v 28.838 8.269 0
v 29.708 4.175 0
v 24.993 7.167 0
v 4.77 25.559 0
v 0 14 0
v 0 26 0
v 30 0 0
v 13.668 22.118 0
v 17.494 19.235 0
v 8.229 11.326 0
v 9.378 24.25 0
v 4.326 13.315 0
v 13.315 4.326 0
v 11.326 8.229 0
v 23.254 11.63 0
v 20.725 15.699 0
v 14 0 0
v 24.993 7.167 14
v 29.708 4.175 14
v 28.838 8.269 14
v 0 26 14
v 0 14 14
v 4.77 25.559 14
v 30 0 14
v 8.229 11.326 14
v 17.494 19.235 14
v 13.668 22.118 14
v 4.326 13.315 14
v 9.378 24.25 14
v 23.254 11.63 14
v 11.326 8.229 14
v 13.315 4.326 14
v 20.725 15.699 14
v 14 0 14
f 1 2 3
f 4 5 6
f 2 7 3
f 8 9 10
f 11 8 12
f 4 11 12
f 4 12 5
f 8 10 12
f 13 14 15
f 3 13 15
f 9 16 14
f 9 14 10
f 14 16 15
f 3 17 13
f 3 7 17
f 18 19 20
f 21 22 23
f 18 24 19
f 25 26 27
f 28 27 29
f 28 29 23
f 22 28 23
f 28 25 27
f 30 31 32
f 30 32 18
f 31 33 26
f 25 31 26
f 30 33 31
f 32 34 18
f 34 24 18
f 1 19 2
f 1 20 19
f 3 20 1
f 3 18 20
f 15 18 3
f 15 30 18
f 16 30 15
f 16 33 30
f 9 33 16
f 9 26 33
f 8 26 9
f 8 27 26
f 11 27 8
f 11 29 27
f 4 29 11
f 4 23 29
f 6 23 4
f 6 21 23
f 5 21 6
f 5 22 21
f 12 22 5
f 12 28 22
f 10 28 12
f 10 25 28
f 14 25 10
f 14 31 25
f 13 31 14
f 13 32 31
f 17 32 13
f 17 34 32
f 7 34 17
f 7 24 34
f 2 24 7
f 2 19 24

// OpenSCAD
$fn = 32;

// ----------------------------------------------------------------------
// Arc stop: segment, 14 mm thick
// ----------------------------------------------------------------------

// --- parameters (mm) ---
profile_height = 14;      // extrusion height
profile_points = 17;      // points of the closed outline

profile = [[30, 0], [29.708, 4.175], [28.838, 8.269], [24.993, 7.167], [23.254, 11.63], [20.725, 15.699], [17.494, 19.235], [13.668, 22.118], [9.378, 24.25], [4.77, 25.559], [0, 26], [0, 14], [4.326, 13.315], [8.229, 11.326], [11.326, 8.229], [13.315, 4.326], [14, 0]];  // single closed polygon, 17 points, counter clockwise

// --- the one profile operation ---
linear_extrude(height = profile_height) polygon(points = profile);
